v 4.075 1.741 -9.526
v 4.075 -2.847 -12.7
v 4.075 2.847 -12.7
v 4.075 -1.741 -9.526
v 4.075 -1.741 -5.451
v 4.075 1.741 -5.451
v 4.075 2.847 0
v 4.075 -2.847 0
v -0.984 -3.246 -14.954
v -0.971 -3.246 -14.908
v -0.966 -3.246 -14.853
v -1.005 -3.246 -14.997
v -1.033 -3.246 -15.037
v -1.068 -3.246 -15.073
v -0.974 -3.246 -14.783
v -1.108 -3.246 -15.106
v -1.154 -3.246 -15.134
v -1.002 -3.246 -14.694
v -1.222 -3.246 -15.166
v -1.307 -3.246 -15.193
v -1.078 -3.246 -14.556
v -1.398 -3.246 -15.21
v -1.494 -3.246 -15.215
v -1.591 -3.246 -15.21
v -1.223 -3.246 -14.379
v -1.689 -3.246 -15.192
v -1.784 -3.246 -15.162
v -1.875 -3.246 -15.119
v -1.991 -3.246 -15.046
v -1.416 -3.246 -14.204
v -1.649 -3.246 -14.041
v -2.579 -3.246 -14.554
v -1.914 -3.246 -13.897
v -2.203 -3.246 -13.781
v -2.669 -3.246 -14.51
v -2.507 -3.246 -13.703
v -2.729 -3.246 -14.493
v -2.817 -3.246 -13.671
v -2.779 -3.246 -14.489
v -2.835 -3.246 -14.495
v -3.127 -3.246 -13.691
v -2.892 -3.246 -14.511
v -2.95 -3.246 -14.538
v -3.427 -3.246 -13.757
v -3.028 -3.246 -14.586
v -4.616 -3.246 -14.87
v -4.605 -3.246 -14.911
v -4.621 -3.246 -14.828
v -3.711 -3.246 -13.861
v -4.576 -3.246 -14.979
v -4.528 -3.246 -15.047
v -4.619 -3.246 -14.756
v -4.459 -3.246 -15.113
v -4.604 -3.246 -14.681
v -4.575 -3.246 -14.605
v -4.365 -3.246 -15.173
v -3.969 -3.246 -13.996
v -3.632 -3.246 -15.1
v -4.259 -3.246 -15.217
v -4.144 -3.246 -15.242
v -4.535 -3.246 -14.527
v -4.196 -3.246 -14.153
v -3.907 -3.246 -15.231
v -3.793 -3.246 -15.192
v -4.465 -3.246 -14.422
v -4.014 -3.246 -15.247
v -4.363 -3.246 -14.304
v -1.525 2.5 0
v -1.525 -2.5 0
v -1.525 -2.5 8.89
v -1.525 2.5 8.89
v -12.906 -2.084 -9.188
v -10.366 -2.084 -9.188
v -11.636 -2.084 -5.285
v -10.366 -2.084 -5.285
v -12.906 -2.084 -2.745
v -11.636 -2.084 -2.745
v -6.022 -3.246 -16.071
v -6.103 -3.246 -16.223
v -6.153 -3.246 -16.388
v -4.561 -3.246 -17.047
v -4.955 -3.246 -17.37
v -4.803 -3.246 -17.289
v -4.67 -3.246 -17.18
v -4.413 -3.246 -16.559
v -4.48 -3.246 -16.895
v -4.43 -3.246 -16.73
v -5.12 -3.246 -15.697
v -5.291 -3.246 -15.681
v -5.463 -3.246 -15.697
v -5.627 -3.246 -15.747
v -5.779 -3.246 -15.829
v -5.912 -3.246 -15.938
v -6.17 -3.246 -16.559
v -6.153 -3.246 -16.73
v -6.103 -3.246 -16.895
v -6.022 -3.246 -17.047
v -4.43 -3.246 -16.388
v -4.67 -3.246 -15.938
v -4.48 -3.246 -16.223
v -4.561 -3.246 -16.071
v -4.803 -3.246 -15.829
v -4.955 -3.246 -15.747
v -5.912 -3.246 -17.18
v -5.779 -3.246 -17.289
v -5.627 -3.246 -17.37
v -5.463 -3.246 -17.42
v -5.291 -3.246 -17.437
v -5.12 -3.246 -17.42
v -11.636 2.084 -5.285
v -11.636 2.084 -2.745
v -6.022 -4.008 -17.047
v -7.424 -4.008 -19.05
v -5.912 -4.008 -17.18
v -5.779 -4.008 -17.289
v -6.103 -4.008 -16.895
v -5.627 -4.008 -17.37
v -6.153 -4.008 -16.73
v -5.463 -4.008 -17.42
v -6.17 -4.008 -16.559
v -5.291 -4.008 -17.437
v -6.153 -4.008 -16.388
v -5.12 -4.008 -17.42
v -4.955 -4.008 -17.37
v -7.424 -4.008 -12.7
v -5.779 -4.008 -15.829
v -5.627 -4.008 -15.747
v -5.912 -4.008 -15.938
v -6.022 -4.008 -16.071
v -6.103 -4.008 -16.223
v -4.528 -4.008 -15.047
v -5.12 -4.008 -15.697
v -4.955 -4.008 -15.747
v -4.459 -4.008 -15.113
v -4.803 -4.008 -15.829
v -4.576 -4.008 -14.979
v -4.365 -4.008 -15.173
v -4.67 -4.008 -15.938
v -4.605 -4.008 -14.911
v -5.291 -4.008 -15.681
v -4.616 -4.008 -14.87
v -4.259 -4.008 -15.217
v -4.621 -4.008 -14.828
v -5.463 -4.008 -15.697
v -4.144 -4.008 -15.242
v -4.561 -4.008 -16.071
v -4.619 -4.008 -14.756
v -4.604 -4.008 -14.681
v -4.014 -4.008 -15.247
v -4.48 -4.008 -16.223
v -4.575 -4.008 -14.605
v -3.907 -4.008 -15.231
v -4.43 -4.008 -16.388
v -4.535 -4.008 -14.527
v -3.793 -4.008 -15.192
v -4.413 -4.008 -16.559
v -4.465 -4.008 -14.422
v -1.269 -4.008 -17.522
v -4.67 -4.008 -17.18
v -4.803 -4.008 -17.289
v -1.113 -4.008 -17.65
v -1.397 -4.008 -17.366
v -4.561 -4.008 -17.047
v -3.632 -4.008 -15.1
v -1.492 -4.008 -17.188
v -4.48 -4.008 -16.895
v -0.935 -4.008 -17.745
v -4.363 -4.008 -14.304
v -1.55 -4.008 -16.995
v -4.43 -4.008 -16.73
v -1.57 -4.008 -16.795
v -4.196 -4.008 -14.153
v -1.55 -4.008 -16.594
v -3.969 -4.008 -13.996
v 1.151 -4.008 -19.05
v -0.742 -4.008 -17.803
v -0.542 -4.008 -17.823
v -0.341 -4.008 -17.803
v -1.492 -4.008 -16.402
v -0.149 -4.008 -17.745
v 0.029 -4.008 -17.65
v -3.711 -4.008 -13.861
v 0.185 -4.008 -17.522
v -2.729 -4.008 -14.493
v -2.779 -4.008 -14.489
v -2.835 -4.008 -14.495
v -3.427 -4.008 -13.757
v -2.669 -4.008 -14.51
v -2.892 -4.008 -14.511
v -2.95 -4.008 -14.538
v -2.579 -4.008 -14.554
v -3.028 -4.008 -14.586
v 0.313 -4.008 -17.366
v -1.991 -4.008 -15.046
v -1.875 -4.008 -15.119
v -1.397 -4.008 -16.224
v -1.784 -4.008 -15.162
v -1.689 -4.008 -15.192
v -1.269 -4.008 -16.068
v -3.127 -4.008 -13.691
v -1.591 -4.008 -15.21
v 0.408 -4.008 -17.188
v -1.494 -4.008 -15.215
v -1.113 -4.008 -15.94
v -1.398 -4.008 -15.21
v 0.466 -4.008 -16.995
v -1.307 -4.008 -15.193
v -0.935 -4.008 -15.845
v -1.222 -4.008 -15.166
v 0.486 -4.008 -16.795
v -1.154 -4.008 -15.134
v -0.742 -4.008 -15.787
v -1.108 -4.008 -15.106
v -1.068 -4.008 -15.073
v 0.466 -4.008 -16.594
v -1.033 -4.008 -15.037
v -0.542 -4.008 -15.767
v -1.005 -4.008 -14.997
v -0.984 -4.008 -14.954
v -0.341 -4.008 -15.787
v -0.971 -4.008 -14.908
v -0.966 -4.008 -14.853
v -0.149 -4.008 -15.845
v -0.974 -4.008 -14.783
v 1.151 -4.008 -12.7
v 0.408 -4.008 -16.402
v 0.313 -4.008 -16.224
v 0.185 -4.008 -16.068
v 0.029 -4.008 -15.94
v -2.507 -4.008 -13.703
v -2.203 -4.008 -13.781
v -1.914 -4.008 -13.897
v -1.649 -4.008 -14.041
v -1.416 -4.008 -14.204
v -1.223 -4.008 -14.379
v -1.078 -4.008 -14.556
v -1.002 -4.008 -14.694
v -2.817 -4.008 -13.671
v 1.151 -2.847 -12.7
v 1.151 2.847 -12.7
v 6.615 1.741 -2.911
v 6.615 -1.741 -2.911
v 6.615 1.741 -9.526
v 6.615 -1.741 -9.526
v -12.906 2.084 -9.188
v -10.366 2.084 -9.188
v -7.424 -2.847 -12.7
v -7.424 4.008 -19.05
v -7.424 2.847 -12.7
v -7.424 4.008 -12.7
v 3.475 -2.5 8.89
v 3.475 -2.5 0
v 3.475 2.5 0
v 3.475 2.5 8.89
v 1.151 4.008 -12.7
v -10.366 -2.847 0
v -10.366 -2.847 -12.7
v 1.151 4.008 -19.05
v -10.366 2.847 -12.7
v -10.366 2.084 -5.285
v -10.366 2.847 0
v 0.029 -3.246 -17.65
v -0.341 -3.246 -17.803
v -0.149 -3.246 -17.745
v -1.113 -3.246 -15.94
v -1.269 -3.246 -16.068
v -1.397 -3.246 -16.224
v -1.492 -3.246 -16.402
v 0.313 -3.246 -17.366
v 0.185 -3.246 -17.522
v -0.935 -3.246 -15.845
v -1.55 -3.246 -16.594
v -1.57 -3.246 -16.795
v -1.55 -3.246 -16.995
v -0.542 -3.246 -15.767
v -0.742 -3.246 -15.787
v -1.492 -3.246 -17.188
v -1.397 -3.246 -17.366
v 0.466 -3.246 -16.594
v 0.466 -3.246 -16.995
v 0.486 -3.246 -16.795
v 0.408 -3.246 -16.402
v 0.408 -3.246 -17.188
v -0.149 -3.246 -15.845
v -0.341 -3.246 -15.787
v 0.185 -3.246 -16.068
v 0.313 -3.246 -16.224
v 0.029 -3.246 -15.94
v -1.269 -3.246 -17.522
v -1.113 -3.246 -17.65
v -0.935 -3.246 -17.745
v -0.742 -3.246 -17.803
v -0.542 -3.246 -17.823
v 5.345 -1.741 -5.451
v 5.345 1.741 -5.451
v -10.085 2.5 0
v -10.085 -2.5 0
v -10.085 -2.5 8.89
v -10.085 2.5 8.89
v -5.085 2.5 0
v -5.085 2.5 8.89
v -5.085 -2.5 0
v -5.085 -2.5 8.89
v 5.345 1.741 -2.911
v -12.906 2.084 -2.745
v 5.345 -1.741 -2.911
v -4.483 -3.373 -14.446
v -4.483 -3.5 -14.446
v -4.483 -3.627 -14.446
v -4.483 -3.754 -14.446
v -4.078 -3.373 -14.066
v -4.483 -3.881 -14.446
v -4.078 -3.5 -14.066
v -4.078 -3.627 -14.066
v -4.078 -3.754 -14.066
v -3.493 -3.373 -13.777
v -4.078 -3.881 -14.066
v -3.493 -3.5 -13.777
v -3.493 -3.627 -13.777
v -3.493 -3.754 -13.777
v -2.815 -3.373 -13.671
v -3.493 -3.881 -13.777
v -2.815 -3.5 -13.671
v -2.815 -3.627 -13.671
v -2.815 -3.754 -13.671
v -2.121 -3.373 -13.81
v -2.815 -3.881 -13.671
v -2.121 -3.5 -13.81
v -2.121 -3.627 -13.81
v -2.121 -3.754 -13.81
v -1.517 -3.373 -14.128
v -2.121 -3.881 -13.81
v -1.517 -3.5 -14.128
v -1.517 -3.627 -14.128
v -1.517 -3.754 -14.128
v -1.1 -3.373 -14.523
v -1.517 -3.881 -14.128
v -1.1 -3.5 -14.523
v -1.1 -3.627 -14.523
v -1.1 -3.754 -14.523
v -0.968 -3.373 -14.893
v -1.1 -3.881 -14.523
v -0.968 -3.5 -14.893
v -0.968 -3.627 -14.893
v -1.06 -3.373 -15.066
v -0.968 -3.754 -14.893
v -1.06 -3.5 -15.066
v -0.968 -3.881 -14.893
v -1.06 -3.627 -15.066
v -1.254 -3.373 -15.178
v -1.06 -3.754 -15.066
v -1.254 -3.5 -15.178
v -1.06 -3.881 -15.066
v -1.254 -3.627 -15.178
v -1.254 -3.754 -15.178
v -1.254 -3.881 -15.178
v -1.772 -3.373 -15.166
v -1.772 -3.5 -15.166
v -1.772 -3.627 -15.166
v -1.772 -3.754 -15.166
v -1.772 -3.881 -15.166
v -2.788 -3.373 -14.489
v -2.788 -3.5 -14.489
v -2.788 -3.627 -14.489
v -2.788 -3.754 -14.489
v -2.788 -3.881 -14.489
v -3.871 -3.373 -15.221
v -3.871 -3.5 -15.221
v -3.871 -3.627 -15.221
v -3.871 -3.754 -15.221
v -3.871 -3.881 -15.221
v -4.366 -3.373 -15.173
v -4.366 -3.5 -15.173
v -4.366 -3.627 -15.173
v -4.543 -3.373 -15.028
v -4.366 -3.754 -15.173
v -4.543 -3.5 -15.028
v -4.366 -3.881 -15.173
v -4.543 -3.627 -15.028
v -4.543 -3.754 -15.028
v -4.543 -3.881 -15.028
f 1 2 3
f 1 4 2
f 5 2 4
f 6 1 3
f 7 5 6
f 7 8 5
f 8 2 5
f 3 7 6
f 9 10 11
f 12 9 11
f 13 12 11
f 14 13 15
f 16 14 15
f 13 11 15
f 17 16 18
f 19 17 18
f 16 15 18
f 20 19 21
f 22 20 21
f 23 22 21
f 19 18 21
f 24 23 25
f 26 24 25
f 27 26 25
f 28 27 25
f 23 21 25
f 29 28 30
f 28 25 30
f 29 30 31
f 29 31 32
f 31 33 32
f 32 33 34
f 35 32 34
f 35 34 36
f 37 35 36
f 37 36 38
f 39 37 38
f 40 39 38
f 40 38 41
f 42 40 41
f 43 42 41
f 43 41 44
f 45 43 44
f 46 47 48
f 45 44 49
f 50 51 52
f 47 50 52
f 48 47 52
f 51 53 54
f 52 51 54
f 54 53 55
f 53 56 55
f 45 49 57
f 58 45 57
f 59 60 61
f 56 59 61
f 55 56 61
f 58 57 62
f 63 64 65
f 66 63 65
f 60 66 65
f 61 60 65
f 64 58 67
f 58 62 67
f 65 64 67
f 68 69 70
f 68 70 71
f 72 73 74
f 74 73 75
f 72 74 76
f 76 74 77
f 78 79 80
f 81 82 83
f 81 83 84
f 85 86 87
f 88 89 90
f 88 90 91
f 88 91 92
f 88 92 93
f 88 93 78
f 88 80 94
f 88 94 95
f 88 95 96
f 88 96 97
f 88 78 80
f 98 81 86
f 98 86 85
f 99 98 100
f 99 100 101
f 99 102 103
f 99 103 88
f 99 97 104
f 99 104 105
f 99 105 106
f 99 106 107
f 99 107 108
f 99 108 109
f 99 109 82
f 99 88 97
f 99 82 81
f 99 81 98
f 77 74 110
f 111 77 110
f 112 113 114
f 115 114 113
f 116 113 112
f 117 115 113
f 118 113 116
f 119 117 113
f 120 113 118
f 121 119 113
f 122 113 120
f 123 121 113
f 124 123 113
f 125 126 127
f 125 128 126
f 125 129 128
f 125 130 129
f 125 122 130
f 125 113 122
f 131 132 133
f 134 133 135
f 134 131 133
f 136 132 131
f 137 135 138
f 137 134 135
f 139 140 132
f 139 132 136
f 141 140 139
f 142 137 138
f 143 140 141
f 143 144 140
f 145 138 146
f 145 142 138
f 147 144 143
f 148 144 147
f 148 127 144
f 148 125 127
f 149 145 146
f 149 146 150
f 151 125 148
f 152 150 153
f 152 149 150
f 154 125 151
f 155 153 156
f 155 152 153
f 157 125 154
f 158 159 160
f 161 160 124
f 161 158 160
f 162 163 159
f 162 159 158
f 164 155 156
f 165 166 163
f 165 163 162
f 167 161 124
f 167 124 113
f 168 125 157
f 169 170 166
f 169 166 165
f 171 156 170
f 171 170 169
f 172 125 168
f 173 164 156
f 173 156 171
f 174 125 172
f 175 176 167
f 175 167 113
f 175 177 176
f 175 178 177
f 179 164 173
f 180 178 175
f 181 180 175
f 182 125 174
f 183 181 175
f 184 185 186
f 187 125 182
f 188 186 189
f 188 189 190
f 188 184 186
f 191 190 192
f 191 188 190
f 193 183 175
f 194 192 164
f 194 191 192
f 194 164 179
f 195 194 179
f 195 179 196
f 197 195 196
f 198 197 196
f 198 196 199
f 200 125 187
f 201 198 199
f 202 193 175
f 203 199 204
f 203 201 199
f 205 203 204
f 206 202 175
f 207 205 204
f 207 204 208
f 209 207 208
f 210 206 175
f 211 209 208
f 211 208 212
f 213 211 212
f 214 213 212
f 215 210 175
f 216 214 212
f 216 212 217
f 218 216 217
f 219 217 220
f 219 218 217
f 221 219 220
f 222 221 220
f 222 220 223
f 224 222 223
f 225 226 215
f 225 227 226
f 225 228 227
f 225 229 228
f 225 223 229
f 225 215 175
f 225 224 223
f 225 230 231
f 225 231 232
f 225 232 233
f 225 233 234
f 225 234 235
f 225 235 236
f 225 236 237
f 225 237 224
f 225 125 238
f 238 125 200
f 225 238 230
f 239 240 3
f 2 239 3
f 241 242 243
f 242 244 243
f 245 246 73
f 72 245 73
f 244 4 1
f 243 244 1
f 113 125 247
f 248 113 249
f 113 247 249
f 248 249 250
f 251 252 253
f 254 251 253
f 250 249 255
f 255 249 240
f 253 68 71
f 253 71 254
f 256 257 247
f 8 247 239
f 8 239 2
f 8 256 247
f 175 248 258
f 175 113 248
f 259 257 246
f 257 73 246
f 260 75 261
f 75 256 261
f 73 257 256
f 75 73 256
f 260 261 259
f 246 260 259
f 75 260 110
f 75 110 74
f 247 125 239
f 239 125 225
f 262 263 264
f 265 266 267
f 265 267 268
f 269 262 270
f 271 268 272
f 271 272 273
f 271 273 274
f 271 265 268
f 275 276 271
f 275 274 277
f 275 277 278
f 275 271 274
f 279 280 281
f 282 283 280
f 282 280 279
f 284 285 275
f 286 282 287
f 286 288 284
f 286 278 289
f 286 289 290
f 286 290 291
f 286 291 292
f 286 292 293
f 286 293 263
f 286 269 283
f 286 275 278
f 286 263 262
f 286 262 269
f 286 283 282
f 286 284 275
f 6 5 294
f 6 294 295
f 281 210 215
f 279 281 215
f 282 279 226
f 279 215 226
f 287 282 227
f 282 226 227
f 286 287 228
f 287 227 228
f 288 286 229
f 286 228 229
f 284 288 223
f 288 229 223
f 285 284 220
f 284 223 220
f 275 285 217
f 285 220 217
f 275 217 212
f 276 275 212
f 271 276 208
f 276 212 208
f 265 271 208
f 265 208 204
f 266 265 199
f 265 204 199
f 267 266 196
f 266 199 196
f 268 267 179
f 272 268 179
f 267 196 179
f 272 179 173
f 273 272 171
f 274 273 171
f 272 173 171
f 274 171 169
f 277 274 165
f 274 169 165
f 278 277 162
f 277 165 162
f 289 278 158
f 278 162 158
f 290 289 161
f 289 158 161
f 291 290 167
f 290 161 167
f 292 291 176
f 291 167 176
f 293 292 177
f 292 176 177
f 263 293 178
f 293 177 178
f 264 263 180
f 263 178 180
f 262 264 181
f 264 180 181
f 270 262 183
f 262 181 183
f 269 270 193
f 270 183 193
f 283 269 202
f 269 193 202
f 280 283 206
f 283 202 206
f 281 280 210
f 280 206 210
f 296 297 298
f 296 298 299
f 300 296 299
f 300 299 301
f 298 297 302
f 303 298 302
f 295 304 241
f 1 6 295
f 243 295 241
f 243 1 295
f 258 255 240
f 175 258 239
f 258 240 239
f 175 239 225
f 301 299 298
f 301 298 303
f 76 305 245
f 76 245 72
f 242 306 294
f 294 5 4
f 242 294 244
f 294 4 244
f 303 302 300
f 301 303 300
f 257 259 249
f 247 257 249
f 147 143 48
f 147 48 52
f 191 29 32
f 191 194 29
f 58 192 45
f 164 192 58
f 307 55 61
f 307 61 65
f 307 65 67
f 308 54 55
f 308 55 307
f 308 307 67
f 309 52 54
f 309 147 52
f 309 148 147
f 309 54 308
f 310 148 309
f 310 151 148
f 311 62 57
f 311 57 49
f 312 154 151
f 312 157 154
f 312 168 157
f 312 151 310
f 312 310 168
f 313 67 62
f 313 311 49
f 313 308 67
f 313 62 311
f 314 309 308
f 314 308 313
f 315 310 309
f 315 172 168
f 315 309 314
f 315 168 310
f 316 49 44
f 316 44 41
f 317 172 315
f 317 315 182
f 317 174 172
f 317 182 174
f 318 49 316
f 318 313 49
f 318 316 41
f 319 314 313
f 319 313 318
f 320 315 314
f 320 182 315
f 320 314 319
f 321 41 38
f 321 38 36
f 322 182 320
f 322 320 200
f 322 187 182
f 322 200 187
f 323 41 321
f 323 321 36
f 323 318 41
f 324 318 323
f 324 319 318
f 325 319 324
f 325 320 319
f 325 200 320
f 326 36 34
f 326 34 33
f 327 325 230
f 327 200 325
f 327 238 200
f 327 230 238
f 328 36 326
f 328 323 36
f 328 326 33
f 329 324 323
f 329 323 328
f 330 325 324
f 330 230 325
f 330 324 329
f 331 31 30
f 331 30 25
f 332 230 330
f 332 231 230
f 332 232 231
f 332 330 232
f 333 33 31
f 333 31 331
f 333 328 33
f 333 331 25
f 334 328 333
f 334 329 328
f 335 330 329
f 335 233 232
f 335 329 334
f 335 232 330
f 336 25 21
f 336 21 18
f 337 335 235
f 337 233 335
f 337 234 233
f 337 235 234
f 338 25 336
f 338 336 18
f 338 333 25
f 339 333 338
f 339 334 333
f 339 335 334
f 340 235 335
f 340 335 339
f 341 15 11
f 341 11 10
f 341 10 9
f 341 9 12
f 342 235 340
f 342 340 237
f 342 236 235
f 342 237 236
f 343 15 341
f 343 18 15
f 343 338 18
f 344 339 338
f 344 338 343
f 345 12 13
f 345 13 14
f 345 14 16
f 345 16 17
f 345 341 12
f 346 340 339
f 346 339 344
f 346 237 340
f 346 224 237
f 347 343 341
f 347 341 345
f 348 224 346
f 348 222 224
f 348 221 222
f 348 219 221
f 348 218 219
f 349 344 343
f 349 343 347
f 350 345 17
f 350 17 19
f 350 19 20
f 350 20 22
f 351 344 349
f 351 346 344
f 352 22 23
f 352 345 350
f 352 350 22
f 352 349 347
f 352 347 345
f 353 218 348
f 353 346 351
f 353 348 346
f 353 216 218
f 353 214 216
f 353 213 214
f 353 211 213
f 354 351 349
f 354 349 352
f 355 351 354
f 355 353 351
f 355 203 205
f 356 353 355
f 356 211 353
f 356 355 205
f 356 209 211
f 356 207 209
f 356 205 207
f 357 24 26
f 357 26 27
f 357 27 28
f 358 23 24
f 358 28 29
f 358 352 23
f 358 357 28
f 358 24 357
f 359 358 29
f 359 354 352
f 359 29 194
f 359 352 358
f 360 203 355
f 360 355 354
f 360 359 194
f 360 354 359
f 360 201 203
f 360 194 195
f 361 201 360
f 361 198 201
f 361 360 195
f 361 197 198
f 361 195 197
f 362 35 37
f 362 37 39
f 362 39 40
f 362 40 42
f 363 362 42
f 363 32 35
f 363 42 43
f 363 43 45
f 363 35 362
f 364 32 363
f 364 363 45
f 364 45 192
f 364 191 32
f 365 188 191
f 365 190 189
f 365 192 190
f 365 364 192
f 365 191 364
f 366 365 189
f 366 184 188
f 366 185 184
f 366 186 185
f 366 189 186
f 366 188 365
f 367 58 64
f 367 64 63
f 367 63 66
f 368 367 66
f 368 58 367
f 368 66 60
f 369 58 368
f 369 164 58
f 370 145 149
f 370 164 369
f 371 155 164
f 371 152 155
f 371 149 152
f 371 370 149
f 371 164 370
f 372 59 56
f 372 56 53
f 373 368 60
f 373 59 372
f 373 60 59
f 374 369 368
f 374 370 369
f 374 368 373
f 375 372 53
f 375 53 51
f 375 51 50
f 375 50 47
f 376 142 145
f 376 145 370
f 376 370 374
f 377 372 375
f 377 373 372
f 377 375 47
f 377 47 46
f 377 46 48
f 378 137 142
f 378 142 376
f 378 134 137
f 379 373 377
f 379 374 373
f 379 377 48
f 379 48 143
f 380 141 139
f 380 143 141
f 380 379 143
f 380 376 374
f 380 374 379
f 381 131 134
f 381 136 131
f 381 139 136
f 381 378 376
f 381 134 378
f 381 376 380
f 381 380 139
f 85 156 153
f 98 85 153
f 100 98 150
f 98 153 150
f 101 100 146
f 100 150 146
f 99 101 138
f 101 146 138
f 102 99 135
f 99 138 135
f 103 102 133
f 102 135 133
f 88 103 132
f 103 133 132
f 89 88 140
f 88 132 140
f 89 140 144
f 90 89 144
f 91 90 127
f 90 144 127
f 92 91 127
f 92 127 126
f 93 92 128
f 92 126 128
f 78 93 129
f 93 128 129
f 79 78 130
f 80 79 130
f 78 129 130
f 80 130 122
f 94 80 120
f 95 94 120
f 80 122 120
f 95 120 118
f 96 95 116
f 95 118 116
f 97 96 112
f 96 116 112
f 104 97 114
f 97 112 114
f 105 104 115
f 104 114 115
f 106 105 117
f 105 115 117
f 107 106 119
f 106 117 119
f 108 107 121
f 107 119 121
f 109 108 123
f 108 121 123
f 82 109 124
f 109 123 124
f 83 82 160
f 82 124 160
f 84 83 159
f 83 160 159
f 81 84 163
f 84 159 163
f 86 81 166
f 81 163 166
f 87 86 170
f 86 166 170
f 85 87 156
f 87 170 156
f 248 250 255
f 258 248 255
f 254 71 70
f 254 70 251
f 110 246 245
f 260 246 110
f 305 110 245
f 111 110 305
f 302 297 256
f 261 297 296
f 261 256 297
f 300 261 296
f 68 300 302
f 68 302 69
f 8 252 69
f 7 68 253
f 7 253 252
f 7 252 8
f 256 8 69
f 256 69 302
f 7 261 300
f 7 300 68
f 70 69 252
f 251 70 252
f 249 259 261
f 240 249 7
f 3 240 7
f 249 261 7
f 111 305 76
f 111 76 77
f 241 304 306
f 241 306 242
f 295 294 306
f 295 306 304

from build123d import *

# Parameters (mm, degrees)
F0_W      = 5
F0_H      = 5
F1_DEPTH  = 8.89
F2_W      = 14.4415530376
F2_H      = 5.6946645491
F3_DEPTH  = 12.7
F4_W      = 8.575418964
F4_H      = 1.1608570348
F4_H_2    = 5.6946645491
F5_DEPTH  = 6.35
F6_W      = 3.4819149878
F6_H      = 4.0748249739
F7_DEPTH  = 2.54
F8_W      = 4.1677881964
F8_H      = 3.9033070207
F9_DEPTH  = 2.54
F11_W     = 1.27
F11_H     = 3.4819149878
F10_W     = 1.27
F10_H     = 4.1677881964
F12_DEPTH = 2.54
F13_R     = 1.0279027568
F13_R_2   = 0.8784163787
F14_DEPTH = 0.762


with BuildPart() as f1:
    # F0 (on Top) → F1 (new body)
    with BuildSketch(Plane.XY):
        with Locations((-7.5847473372, 0)):
            Rectangle(F0_W, F0_H)
    extrude(amount=F1_DEPTH)



with BuildPart() as f1b:
    # F0 (on Top) → F1, piece 2 (new body)
    with BuildSketch(Plane.XY):
        with Locations((0.9745767244, 0)):
            Rectangle(F0_W, F0_H)
    extrude(amount=F1_DEPTH)


with BuildPart() as f1_1:
    add(f1.part)

    add(f1b.part)  # F3 merges F1b
    # F2 (on Top) → F3 (join)
    with BuildSketch(Plane.XY):
        with Locations((-3.1453159172, 0)):
            Rectangle(F2_W, F2_H)
    extrude(amount=-F3_DEPTH)

    # F4 (on face) → F5 (join)
    with BuildSketch(Plane(origin=(0, 0, -12.7), x_dir=(1, 0, 0), z_dir=(0, 0, -1))):
        with Locations((-3.1367521733, -3.427760792)):
            Rectangle(F4_W, F4_H)
        with Locations((-3.1367521733, 3.427760792)):
            Rectangle(F4_W, F4_H)
        with Locations((-3.1367521733, 0)):
            Rectangle(F4_W, F4_H_2)
    extrude(amount=F5_DEPTH)

    # F6 (on face) → F7 (join)
    with BuildSketch(Plane.YZ.offset(4.0754606016)):
        with Locations((0, -7.4885827489)):
            Rectangle(F6_W, F6_H)
    extrude(amount=F7_DEPTH)

    # F8 (on face) → F9 (join)
    with BuildSketch(Plane(origin=(-10.366092436, 0, 0), x_dir=(0, -1, 0), z_dir=(-1, 0, 0))):
        with Locations((0, -7.2363391519)):
            Rectangle(F8_W, F8_H)
    extrude(amount=F9_DEPTH)

    # F11 (on face) + F10 (on face) → F12 (join)
    with BuildSketch(Plane.XY.offset(-5.4511702619)):
        with Locations((5.9804606016, 0)):
            Rectangle(F11_W, F11_H)
    with BuildSketch(Plane.XY.offset(-5.2846856415)):
        with Locations((-12.271092436, 0)):
            Rectangle(F10_W, F10_H)
    extrude(amount=F12_DEPTH)

    # F13 (on face) → F14 (cut)
    with BuildSketch(Plane.XZ.offset(4.0081893094)):
        with Locations((-0.5419000518, -16.7948883027)):
            Circle(F13_R)
        with Locations((-5.2912211977, -16.5589284152)):
            Circle(F13_R_2)
        with BuildLine():
            add(Edge.make_bspline(
                [(-4.6211974695, -14.8275010288), (-4.6525107879, -14.3582631191), (-2.8178407576, -12.9321177777), (-0.316711825, -14.9404321969), (-1.9384263234, -15.4575665045), (-2.7810199858, -13.9257072681), (-3.7237353615, -15.5727199427), (-4.6015179058, -15.1224042148), (-4.6211974695, -14.8275010288)],
                knots=[0, 0, 0, 0, 0.2079480328, 0.4192374914, 0.5500370632, 0.7069707366, 0.8693103517, 1, 1, 1, 1], degree=3))
        make_face()
    extrude(amount=-F14_DEPTH, mode=Mode.SUBTRACT)


solid = f1_1.part
